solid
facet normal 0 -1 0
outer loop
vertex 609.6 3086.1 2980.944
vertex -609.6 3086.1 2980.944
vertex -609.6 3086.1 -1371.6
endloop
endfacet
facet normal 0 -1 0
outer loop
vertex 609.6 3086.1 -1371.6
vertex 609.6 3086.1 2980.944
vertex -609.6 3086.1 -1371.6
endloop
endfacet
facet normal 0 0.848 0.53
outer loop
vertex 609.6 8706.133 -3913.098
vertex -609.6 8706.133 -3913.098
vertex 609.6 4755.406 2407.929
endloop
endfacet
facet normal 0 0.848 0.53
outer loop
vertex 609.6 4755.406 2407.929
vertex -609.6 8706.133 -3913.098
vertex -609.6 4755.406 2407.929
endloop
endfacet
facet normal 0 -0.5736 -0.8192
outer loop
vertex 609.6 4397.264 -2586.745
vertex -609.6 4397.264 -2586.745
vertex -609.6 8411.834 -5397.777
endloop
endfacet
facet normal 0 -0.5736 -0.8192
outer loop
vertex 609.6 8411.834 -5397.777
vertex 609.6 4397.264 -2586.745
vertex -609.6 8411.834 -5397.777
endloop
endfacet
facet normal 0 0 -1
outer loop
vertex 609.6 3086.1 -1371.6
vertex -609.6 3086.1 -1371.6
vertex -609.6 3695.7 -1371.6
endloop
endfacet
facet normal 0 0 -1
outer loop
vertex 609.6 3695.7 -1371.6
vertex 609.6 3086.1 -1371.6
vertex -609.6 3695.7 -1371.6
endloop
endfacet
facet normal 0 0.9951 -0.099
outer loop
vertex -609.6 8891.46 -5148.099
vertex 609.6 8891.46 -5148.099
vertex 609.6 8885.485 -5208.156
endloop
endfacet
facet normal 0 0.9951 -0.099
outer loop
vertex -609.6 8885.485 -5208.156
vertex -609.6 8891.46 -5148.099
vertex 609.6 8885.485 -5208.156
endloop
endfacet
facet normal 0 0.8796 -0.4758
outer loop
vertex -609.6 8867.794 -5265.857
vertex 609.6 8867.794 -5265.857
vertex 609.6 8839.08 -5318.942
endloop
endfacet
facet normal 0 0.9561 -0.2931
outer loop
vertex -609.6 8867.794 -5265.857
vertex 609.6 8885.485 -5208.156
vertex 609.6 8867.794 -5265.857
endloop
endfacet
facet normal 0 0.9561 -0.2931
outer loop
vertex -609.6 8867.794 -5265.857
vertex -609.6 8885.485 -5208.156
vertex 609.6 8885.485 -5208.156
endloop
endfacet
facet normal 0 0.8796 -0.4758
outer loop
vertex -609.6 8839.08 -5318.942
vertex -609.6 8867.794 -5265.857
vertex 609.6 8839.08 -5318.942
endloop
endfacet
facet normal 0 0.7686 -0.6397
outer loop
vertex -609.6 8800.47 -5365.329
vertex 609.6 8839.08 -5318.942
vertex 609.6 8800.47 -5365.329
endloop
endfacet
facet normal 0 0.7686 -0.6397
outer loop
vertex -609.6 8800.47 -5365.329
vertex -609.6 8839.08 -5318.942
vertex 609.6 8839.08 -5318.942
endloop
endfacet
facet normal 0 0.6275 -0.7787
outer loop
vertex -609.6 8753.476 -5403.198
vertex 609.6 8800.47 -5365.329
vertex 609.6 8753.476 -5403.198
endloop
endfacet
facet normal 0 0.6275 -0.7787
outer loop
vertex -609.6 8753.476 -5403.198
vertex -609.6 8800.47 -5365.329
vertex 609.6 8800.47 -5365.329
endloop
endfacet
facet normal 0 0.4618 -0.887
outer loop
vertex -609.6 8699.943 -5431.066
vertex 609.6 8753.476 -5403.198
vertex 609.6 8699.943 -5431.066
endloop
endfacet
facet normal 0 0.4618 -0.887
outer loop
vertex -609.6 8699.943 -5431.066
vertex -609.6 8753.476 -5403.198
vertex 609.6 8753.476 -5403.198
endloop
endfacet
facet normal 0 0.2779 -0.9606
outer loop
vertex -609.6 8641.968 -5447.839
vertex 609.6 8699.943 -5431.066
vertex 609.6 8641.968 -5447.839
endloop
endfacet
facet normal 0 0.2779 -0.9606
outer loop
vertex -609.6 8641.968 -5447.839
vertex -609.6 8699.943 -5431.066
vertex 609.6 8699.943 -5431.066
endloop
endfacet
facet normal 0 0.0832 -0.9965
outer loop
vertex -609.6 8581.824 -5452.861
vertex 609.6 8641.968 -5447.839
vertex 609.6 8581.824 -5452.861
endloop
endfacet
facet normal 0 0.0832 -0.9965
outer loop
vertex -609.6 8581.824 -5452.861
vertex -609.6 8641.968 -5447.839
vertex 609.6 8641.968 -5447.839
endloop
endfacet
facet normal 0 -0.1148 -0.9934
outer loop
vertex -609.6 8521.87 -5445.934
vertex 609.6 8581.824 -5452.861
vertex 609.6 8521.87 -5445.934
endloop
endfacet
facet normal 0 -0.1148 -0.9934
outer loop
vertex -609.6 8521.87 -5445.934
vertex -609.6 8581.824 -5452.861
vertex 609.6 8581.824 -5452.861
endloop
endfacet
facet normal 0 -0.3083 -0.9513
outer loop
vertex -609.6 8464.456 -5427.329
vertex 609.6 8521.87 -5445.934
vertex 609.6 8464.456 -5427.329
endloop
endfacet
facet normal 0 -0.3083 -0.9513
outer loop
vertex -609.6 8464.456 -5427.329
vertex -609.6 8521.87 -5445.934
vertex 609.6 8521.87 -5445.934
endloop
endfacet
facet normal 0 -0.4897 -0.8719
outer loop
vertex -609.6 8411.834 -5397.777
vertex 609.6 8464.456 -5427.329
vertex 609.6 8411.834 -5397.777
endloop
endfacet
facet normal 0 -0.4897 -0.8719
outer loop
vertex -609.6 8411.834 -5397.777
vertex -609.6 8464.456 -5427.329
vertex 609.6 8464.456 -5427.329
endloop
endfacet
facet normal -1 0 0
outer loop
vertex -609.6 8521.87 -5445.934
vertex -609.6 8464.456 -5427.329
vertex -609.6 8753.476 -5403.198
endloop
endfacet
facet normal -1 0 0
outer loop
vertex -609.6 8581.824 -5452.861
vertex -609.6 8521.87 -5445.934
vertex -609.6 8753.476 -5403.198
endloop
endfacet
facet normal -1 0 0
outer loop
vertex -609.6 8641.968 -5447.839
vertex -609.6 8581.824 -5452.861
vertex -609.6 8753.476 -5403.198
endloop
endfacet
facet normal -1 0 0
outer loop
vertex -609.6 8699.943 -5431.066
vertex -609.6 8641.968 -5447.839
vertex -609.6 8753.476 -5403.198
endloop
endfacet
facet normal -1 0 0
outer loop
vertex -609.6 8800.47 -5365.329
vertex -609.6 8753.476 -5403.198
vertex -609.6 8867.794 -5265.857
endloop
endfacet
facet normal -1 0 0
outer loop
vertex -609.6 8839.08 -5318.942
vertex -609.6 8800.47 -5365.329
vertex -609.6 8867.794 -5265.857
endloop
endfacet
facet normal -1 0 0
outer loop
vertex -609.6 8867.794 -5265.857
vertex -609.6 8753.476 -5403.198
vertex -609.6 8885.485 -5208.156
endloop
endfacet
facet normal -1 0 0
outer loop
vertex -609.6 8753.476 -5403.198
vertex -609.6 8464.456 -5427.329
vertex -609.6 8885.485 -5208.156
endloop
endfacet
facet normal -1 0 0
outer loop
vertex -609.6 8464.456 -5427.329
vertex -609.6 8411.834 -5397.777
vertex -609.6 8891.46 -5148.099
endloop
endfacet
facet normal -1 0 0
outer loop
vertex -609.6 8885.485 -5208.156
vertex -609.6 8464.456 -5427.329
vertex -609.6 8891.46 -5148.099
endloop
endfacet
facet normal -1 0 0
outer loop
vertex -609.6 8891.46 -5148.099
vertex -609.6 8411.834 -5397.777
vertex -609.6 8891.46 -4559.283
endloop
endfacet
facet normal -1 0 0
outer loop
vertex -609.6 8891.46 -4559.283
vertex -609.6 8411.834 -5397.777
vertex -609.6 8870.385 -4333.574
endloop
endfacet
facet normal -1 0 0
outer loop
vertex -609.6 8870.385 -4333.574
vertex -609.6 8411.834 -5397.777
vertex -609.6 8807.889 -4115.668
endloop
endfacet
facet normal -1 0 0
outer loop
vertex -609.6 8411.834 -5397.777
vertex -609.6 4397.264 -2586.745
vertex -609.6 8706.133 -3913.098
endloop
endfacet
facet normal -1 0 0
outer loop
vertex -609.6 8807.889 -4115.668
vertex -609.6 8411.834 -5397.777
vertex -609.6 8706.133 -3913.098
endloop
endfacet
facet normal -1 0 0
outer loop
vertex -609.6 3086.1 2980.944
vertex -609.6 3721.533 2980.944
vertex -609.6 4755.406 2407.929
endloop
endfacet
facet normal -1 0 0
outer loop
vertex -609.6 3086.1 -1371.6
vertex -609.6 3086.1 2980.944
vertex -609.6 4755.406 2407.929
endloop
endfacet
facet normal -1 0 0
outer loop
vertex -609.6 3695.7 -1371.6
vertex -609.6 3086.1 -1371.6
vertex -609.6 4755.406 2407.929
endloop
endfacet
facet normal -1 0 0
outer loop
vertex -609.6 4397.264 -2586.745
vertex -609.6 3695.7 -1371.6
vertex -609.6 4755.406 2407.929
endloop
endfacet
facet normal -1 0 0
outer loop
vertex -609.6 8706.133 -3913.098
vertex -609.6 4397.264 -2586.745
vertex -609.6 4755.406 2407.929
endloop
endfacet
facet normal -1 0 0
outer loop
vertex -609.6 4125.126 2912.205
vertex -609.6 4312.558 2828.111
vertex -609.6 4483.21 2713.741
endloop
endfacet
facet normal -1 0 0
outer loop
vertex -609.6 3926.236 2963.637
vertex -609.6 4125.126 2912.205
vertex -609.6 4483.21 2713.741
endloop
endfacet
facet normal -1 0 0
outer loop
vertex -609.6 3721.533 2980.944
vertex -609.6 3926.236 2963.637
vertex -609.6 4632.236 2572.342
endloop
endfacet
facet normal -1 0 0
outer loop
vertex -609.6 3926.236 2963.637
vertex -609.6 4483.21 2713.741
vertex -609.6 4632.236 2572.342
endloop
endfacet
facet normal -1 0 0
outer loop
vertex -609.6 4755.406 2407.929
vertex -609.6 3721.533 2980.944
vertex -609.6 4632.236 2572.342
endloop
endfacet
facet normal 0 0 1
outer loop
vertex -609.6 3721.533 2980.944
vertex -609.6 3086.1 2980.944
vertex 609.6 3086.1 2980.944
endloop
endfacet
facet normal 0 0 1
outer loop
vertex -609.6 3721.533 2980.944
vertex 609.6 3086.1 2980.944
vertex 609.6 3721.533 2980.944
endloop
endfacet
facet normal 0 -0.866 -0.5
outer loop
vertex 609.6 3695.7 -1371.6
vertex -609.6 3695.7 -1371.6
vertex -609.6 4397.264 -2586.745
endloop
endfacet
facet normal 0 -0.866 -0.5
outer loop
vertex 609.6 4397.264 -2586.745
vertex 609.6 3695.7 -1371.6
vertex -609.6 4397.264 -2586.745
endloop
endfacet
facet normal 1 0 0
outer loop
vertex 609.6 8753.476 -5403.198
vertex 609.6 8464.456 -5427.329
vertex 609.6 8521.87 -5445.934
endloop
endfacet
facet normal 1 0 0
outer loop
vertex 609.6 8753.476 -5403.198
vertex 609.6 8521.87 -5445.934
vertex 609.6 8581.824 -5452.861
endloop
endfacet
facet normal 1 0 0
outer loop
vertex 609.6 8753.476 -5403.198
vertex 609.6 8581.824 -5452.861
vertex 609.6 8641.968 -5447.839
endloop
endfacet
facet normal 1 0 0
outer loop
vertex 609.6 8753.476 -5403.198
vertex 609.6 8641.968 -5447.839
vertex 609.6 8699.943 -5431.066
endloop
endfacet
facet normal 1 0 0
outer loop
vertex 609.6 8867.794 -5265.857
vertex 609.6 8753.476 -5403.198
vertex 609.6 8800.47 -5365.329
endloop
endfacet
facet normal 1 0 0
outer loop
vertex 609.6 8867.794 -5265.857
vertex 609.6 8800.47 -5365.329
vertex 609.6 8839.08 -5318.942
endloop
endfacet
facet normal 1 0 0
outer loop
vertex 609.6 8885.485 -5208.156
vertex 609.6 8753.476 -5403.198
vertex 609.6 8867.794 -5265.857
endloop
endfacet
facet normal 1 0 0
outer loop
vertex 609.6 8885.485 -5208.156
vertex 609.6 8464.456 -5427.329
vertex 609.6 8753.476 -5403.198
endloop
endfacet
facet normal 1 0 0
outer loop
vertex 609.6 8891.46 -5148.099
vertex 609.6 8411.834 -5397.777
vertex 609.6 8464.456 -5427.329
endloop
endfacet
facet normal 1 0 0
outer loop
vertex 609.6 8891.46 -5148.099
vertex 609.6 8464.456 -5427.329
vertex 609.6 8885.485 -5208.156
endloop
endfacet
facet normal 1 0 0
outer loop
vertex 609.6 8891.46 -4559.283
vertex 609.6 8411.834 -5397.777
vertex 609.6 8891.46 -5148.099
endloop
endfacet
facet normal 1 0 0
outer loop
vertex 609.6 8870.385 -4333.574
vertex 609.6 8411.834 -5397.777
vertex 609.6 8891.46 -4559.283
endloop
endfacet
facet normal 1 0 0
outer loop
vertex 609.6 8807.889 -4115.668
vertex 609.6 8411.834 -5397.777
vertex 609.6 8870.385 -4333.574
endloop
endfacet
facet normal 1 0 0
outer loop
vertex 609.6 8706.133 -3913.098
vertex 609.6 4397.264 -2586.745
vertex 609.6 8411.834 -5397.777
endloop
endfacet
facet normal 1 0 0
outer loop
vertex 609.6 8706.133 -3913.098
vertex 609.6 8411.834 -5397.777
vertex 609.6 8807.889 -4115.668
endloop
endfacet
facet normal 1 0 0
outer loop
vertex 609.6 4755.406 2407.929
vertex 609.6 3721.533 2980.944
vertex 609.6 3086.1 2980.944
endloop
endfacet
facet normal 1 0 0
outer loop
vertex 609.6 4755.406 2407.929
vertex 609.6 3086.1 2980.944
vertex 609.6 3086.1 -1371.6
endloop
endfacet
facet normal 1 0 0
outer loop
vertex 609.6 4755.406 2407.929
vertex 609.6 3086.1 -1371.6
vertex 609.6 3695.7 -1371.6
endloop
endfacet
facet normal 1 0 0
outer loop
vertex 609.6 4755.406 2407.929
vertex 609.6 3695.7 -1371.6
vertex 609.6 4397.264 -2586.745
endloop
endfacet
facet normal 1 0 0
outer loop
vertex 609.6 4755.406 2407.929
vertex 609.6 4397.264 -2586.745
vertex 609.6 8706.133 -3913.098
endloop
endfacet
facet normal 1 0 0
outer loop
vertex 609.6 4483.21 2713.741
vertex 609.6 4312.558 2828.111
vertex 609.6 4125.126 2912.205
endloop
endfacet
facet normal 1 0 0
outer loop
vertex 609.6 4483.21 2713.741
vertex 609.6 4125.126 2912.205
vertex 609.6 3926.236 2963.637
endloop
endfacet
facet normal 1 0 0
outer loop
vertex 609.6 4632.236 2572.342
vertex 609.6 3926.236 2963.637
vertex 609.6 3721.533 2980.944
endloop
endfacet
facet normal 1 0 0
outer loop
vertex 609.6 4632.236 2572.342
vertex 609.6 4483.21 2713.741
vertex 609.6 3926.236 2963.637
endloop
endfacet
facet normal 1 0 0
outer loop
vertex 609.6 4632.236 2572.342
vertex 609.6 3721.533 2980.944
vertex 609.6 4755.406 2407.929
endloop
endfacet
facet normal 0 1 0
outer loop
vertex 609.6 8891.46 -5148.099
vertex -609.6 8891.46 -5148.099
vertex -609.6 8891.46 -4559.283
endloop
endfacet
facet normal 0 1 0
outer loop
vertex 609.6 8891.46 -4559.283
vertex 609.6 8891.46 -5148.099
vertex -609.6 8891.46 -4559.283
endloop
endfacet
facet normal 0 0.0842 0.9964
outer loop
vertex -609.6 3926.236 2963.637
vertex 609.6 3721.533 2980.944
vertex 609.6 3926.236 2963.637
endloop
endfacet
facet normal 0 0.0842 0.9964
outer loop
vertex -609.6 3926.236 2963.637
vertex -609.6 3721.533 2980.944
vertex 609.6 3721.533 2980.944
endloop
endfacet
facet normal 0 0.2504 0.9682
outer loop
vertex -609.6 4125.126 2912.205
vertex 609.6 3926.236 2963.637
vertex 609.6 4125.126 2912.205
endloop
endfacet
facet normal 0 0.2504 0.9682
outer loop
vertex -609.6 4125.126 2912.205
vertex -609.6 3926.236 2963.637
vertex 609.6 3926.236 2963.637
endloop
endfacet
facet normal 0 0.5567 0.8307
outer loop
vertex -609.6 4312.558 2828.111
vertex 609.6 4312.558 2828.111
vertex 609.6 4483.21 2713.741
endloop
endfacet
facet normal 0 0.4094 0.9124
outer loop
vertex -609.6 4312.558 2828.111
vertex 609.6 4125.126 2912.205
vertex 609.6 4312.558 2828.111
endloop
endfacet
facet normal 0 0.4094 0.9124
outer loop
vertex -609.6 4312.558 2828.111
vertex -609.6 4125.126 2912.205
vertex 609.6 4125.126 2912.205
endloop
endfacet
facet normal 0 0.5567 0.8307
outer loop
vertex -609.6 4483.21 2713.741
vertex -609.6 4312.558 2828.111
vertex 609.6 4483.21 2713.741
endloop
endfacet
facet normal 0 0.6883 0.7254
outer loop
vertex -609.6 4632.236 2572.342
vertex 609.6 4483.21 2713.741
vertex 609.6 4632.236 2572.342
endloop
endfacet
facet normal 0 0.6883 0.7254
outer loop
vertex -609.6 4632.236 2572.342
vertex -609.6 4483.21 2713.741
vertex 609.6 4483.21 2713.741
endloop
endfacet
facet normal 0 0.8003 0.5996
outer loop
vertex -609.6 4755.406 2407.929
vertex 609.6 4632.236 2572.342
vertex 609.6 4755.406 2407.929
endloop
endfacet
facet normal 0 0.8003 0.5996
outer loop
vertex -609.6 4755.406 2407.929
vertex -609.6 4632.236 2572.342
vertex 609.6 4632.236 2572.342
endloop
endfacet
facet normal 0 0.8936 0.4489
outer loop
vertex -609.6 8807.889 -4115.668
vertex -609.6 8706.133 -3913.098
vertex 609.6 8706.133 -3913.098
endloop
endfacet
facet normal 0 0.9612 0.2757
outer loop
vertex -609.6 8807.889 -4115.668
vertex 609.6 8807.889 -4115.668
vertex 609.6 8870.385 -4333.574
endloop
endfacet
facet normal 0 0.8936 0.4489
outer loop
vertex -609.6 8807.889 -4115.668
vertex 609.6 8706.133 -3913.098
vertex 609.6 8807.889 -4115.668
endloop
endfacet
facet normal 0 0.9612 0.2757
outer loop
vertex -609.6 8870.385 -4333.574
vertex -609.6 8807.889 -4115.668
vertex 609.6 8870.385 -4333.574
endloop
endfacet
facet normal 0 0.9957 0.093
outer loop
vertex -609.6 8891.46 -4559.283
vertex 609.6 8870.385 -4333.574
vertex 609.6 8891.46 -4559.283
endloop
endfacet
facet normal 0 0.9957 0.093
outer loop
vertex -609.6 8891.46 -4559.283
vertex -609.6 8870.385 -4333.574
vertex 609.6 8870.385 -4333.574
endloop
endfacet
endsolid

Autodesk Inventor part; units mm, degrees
ref_plane "YZ Plane" through (0, 0, 0) normal (1, 0, 0) x (0, 1, 0)
ref_plane "XZ Plane" through (0, 0, 0) normal (0, 1, 0) x (-1, 0, 0)
ref_plane "XY Plane" through (0, 0, 0) normal (0, 0, 1) x (1, 0, 0)
sketch "Sketch18" plane through (0, 0, 0) normal (1, 0, 0) x (0, 1, 0)
  line L0 (3086.1, 2980.944) -> (3721.5332, 2980.944)
  line L1 (3086.1, 2980.944) -> (3086.1, -1371.6)
  line L2 (3086.1, -1371.6) -> (3695.7, -1371.6)
  line L3 (3695.7, -1371.6) -> (4397.2643, -2586.7449)
  line L4 (4397.2643, -2586.7449) -> (3787.6643, -1530.8868)
  line L5 (4397.2643, -2586.7449) -> (8411.8339, -5397.7769)
  line L6 (4397.2643, -2586.7449) -> (9298.1489, -2586.7449) construction
  line L7 (8891.46, -5148.0993) -> (8891.46, -4559.283)
  line L8 (8706.1333, -3913.0983) -> (4755.4065, 2407.9287)
  arc A0 (4755.4065, 2407.9287) -> (3721.5332, 2980.944) centre (3721.5332, 1761.744) ccw
  arc A1 (8891.46, -4559.283) -> (8706.1333, -3913.0983) centre (7672.26, -4559.283) ccw
  arc A2 (8411.8339, -5397.7769) -> (8891.46, -5148.0993) centre (8586.66, -5148.0993) ccw
  point P0 (0, 0)
  point P1 (8891.46, -5733.6147)
  point P2 (8891.46, -4209.6147)
  dimension "d85" = 4352.544
  dimension "d89" = 5486.4
  dimension "d90" = 35
  dimension "d91" = 1524
  dimension "d92" = 1219.2
  dimension "d93" = 304.8
extrude "Extrusion16" add sketch "Sketch18" along normal mid plane 1219.2
properties part number "vertical_tail" material "Steel, Mild"
